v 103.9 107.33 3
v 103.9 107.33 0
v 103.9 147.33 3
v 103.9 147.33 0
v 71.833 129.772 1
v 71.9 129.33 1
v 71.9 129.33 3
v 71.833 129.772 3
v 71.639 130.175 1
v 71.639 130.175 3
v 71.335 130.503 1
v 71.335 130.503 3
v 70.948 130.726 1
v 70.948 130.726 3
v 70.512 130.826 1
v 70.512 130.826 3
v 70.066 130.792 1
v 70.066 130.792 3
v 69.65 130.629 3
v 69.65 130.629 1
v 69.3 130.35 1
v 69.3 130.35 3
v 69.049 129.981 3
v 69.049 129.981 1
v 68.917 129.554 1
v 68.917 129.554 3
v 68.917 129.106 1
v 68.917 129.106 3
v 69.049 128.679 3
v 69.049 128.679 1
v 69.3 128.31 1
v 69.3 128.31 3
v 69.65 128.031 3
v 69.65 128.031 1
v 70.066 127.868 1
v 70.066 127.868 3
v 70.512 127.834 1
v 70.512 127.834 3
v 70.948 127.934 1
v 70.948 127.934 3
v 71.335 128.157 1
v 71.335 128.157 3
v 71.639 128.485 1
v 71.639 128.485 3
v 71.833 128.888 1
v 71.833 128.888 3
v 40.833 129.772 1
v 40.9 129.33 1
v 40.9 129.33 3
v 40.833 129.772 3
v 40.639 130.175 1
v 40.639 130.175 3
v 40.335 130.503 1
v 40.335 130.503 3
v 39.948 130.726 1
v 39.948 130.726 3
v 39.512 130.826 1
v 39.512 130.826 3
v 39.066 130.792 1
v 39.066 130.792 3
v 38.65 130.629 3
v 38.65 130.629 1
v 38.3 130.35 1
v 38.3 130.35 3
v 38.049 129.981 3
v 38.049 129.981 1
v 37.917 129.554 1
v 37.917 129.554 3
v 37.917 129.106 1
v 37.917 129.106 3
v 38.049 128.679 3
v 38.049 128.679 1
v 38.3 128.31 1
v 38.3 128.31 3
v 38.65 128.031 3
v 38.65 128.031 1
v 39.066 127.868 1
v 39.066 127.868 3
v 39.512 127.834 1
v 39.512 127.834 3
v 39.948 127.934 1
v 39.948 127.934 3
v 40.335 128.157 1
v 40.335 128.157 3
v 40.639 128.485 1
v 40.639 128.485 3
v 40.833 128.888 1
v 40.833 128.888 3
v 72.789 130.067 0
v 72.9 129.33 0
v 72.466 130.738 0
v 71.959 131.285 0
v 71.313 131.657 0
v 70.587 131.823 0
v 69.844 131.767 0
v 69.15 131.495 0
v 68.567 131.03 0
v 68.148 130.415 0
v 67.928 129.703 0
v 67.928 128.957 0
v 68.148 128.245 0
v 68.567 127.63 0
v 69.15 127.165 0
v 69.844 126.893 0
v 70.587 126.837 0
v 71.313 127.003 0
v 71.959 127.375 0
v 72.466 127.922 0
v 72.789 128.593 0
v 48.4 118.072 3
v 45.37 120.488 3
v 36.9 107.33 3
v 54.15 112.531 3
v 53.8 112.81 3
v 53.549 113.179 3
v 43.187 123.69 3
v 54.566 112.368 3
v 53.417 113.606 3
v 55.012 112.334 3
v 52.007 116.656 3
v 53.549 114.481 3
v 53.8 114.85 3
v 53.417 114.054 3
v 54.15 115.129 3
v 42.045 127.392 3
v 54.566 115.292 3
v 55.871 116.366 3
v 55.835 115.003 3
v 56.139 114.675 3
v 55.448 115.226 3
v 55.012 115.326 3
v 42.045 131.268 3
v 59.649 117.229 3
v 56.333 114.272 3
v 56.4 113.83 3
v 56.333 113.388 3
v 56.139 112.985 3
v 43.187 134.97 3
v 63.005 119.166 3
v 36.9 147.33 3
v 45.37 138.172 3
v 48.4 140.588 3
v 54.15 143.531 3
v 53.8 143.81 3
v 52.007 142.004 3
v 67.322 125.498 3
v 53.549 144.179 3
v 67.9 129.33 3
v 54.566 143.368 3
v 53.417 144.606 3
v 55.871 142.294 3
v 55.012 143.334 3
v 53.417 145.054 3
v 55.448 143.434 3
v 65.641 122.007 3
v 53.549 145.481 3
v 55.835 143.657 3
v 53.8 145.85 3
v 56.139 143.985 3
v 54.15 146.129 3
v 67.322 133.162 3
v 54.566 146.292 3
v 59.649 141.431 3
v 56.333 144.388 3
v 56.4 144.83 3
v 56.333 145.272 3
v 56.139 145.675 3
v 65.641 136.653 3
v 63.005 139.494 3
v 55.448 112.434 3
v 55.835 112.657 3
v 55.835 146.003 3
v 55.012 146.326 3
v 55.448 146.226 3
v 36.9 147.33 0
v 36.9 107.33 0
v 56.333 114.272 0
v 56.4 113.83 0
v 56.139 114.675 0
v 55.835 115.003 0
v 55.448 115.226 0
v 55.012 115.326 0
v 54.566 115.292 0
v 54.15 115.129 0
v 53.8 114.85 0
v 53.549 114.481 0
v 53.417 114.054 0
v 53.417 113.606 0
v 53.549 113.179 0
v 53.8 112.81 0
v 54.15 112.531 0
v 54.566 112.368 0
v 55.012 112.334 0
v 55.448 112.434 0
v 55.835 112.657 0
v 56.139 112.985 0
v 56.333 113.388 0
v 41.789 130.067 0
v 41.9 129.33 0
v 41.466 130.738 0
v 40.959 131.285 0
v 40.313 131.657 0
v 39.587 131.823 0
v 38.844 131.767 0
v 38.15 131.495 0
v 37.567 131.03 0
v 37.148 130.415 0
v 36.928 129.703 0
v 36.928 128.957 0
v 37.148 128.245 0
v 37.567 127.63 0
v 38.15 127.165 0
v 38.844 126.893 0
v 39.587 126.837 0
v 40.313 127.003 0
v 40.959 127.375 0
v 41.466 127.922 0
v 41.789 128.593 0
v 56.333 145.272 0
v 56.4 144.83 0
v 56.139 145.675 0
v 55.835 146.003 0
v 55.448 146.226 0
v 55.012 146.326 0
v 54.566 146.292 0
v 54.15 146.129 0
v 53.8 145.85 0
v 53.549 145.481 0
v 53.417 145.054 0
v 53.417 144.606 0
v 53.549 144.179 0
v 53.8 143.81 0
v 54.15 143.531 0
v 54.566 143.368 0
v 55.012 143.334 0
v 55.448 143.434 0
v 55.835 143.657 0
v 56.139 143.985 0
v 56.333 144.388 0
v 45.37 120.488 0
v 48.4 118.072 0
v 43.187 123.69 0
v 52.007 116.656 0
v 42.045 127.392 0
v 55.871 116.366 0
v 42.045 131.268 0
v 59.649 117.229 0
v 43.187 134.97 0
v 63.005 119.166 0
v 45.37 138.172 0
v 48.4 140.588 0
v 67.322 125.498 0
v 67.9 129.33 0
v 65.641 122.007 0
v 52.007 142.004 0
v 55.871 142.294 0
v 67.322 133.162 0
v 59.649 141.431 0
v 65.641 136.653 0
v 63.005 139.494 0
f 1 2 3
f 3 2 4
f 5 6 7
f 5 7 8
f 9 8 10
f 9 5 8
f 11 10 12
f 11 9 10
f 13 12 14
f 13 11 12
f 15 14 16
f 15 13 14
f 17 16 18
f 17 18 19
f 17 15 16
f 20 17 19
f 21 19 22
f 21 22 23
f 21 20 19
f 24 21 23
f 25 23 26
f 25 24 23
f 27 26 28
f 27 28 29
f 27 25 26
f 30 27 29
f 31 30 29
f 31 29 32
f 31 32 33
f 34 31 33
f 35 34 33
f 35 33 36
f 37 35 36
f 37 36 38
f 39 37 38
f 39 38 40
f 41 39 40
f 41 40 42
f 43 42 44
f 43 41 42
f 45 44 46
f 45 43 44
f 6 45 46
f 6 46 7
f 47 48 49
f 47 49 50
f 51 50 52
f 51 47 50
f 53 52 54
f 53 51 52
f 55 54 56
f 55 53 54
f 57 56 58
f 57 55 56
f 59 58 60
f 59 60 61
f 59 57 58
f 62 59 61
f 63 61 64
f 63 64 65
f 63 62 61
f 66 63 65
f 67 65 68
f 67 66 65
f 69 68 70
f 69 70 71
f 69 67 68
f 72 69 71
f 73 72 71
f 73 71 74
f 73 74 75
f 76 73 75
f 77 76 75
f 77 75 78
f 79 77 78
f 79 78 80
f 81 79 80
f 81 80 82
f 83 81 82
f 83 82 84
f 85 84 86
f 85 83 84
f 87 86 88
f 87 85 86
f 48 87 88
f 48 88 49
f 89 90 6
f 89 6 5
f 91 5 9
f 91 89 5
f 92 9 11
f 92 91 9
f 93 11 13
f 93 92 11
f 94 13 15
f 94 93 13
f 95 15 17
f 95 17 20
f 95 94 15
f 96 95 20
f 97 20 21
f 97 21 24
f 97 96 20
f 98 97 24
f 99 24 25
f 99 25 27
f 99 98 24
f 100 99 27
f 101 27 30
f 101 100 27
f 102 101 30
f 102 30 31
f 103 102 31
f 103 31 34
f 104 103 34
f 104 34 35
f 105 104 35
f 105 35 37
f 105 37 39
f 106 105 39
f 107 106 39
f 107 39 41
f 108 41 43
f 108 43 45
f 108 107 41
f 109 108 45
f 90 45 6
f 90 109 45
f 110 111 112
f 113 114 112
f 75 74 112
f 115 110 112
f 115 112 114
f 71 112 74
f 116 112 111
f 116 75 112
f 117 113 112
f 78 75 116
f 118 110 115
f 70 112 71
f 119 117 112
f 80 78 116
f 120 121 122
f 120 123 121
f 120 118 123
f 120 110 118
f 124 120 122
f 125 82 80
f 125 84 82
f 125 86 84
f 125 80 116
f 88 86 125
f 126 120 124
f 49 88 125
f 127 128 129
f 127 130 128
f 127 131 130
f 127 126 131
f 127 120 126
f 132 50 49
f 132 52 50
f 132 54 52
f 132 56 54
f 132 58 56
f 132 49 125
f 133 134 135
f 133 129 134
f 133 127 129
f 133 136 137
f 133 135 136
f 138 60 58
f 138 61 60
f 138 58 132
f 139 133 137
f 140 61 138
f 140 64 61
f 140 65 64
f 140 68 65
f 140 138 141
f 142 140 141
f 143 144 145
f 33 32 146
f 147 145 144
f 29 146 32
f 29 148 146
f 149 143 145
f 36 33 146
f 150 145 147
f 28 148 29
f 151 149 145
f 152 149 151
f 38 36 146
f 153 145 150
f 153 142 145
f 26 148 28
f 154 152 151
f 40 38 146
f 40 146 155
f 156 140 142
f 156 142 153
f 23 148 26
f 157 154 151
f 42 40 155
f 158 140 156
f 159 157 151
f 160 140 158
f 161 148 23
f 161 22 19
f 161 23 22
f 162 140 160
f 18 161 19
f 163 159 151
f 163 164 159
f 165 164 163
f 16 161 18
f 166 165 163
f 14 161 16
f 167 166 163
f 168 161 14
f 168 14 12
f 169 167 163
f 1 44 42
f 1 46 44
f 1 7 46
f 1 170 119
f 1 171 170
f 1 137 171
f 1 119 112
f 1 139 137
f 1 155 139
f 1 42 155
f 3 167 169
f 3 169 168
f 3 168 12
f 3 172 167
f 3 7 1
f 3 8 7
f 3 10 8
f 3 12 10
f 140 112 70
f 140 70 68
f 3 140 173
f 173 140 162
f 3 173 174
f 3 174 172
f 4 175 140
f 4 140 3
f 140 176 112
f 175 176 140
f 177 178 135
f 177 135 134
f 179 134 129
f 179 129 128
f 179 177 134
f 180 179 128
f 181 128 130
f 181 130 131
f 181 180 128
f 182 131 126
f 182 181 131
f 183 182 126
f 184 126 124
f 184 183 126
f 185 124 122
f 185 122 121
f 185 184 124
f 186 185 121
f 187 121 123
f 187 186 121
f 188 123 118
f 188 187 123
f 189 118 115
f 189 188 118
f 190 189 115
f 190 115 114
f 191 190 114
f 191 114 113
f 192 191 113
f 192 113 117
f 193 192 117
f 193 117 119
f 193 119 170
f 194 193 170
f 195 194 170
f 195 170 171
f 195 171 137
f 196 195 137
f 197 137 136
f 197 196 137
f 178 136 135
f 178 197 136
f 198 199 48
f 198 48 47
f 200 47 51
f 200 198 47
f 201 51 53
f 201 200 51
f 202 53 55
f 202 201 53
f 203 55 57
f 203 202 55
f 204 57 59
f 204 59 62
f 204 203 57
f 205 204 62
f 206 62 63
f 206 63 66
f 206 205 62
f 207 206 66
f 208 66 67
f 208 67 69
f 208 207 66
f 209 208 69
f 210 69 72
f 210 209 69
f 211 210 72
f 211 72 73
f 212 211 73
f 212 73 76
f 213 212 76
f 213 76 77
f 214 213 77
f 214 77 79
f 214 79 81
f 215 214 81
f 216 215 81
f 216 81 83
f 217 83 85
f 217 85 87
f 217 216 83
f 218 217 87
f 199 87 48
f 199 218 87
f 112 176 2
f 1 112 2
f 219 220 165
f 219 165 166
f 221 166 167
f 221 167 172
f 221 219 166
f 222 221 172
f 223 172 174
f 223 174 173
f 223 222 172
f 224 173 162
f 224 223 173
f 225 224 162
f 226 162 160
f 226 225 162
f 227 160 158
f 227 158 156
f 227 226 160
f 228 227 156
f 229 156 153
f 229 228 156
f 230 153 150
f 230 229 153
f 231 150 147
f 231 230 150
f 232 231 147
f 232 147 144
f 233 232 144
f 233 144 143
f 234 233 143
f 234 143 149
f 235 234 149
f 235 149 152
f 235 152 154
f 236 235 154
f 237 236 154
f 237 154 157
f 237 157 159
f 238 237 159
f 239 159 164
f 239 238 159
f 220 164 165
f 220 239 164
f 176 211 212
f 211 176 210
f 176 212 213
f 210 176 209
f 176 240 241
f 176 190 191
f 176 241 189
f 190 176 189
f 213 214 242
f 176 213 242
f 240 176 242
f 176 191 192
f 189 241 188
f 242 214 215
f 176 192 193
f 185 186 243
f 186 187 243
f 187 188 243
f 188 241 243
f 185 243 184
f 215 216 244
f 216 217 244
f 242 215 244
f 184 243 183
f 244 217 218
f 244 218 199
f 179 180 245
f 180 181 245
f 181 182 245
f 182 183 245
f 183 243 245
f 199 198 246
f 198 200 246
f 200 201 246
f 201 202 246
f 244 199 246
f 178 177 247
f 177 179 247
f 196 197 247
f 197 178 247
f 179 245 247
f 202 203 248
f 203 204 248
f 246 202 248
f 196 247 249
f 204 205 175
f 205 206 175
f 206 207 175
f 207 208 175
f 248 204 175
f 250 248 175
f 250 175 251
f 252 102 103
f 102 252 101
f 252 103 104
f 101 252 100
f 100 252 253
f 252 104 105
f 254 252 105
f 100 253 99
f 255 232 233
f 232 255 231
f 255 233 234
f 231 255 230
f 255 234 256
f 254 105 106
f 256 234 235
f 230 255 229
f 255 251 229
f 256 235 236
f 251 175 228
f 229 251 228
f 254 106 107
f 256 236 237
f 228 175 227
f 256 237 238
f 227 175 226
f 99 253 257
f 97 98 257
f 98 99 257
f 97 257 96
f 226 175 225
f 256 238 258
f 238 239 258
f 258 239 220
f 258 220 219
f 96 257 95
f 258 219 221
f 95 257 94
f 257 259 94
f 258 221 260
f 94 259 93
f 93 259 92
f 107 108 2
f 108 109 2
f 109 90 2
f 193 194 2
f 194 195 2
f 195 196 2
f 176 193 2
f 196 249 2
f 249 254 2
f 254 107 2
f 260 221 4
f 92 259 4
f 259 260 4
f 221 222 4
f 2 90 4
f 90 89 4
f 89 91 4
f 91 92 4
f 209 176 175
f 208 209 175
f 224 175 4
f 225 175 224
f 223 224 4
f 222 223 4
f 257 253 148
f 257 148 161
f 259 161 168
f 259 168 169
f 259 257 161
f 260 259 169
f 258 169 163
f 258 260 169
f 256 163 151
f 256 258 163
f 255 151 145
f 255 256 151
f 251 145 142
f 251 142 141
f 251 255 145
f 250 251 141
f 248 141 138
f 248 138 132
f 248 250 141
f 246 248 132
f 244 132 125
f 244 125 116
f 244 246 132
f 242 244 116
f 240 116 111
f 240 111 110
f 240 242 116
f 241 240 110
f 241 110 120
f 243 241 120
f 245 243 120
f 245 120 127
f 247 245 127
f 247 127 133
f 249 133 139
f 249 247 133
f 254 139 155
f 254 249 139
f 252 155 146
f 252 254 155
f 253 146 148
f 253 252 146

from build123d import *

# Parameters (mm, degrees)
SKETCH1_W           = 67
SKETCH1_H           = 40
SKETCH1_R           = 13
SKETCH1_R_2         = 1.5
BOSS_EXTRUDE1_DEPTH = 3
CHAMFER1_SIZE       = 1


with BuildPart() as part:
    # Sketch1 → Boss-Extrude1 (new body)
    with BuildSketch(Plane.XY):
        with Locations((70.4, 127.33)):
            Rectangle(SKETCH1_W, SKETCH1_H)
        with Locations((54.9, 129.33)):
            Circle(SKETCH1_R, mode=Mode.SUBTRACT)
        with Locations((39.4, 129.33)):
            Circle(SKETCH1_R_2, mode=Mode.SUBTRACT)
        with Locations((54.9, 144.83)):
            Circle(SKETCH1_R_2, mode=Mode.SUBTRACT)
        with Locations((70.4, 129.33)):
            Circle(SKETCH1_R_2, mode=Mode.SUBTRACT)
        with Locations((54.9, 113.83)):
            Circle(SKETCH1_R_2, mode=Mode.SUBTRACT)
    extrude(amount=BOSS_EXTRUDE1_DEPTH)

    # Chamfer1
    chamfer1_edges = [part.edges().sort_by_distance(p)[0] for p in [
        (37.9, 129.33, 0),
        (68.9, 129.33, 0),
    ]]
    chamfer(chamfer1_edges, length=CHAMFER1_SIZE - 0.0001)  # a hair under: the kernel refuses the full size


solid = part.part
